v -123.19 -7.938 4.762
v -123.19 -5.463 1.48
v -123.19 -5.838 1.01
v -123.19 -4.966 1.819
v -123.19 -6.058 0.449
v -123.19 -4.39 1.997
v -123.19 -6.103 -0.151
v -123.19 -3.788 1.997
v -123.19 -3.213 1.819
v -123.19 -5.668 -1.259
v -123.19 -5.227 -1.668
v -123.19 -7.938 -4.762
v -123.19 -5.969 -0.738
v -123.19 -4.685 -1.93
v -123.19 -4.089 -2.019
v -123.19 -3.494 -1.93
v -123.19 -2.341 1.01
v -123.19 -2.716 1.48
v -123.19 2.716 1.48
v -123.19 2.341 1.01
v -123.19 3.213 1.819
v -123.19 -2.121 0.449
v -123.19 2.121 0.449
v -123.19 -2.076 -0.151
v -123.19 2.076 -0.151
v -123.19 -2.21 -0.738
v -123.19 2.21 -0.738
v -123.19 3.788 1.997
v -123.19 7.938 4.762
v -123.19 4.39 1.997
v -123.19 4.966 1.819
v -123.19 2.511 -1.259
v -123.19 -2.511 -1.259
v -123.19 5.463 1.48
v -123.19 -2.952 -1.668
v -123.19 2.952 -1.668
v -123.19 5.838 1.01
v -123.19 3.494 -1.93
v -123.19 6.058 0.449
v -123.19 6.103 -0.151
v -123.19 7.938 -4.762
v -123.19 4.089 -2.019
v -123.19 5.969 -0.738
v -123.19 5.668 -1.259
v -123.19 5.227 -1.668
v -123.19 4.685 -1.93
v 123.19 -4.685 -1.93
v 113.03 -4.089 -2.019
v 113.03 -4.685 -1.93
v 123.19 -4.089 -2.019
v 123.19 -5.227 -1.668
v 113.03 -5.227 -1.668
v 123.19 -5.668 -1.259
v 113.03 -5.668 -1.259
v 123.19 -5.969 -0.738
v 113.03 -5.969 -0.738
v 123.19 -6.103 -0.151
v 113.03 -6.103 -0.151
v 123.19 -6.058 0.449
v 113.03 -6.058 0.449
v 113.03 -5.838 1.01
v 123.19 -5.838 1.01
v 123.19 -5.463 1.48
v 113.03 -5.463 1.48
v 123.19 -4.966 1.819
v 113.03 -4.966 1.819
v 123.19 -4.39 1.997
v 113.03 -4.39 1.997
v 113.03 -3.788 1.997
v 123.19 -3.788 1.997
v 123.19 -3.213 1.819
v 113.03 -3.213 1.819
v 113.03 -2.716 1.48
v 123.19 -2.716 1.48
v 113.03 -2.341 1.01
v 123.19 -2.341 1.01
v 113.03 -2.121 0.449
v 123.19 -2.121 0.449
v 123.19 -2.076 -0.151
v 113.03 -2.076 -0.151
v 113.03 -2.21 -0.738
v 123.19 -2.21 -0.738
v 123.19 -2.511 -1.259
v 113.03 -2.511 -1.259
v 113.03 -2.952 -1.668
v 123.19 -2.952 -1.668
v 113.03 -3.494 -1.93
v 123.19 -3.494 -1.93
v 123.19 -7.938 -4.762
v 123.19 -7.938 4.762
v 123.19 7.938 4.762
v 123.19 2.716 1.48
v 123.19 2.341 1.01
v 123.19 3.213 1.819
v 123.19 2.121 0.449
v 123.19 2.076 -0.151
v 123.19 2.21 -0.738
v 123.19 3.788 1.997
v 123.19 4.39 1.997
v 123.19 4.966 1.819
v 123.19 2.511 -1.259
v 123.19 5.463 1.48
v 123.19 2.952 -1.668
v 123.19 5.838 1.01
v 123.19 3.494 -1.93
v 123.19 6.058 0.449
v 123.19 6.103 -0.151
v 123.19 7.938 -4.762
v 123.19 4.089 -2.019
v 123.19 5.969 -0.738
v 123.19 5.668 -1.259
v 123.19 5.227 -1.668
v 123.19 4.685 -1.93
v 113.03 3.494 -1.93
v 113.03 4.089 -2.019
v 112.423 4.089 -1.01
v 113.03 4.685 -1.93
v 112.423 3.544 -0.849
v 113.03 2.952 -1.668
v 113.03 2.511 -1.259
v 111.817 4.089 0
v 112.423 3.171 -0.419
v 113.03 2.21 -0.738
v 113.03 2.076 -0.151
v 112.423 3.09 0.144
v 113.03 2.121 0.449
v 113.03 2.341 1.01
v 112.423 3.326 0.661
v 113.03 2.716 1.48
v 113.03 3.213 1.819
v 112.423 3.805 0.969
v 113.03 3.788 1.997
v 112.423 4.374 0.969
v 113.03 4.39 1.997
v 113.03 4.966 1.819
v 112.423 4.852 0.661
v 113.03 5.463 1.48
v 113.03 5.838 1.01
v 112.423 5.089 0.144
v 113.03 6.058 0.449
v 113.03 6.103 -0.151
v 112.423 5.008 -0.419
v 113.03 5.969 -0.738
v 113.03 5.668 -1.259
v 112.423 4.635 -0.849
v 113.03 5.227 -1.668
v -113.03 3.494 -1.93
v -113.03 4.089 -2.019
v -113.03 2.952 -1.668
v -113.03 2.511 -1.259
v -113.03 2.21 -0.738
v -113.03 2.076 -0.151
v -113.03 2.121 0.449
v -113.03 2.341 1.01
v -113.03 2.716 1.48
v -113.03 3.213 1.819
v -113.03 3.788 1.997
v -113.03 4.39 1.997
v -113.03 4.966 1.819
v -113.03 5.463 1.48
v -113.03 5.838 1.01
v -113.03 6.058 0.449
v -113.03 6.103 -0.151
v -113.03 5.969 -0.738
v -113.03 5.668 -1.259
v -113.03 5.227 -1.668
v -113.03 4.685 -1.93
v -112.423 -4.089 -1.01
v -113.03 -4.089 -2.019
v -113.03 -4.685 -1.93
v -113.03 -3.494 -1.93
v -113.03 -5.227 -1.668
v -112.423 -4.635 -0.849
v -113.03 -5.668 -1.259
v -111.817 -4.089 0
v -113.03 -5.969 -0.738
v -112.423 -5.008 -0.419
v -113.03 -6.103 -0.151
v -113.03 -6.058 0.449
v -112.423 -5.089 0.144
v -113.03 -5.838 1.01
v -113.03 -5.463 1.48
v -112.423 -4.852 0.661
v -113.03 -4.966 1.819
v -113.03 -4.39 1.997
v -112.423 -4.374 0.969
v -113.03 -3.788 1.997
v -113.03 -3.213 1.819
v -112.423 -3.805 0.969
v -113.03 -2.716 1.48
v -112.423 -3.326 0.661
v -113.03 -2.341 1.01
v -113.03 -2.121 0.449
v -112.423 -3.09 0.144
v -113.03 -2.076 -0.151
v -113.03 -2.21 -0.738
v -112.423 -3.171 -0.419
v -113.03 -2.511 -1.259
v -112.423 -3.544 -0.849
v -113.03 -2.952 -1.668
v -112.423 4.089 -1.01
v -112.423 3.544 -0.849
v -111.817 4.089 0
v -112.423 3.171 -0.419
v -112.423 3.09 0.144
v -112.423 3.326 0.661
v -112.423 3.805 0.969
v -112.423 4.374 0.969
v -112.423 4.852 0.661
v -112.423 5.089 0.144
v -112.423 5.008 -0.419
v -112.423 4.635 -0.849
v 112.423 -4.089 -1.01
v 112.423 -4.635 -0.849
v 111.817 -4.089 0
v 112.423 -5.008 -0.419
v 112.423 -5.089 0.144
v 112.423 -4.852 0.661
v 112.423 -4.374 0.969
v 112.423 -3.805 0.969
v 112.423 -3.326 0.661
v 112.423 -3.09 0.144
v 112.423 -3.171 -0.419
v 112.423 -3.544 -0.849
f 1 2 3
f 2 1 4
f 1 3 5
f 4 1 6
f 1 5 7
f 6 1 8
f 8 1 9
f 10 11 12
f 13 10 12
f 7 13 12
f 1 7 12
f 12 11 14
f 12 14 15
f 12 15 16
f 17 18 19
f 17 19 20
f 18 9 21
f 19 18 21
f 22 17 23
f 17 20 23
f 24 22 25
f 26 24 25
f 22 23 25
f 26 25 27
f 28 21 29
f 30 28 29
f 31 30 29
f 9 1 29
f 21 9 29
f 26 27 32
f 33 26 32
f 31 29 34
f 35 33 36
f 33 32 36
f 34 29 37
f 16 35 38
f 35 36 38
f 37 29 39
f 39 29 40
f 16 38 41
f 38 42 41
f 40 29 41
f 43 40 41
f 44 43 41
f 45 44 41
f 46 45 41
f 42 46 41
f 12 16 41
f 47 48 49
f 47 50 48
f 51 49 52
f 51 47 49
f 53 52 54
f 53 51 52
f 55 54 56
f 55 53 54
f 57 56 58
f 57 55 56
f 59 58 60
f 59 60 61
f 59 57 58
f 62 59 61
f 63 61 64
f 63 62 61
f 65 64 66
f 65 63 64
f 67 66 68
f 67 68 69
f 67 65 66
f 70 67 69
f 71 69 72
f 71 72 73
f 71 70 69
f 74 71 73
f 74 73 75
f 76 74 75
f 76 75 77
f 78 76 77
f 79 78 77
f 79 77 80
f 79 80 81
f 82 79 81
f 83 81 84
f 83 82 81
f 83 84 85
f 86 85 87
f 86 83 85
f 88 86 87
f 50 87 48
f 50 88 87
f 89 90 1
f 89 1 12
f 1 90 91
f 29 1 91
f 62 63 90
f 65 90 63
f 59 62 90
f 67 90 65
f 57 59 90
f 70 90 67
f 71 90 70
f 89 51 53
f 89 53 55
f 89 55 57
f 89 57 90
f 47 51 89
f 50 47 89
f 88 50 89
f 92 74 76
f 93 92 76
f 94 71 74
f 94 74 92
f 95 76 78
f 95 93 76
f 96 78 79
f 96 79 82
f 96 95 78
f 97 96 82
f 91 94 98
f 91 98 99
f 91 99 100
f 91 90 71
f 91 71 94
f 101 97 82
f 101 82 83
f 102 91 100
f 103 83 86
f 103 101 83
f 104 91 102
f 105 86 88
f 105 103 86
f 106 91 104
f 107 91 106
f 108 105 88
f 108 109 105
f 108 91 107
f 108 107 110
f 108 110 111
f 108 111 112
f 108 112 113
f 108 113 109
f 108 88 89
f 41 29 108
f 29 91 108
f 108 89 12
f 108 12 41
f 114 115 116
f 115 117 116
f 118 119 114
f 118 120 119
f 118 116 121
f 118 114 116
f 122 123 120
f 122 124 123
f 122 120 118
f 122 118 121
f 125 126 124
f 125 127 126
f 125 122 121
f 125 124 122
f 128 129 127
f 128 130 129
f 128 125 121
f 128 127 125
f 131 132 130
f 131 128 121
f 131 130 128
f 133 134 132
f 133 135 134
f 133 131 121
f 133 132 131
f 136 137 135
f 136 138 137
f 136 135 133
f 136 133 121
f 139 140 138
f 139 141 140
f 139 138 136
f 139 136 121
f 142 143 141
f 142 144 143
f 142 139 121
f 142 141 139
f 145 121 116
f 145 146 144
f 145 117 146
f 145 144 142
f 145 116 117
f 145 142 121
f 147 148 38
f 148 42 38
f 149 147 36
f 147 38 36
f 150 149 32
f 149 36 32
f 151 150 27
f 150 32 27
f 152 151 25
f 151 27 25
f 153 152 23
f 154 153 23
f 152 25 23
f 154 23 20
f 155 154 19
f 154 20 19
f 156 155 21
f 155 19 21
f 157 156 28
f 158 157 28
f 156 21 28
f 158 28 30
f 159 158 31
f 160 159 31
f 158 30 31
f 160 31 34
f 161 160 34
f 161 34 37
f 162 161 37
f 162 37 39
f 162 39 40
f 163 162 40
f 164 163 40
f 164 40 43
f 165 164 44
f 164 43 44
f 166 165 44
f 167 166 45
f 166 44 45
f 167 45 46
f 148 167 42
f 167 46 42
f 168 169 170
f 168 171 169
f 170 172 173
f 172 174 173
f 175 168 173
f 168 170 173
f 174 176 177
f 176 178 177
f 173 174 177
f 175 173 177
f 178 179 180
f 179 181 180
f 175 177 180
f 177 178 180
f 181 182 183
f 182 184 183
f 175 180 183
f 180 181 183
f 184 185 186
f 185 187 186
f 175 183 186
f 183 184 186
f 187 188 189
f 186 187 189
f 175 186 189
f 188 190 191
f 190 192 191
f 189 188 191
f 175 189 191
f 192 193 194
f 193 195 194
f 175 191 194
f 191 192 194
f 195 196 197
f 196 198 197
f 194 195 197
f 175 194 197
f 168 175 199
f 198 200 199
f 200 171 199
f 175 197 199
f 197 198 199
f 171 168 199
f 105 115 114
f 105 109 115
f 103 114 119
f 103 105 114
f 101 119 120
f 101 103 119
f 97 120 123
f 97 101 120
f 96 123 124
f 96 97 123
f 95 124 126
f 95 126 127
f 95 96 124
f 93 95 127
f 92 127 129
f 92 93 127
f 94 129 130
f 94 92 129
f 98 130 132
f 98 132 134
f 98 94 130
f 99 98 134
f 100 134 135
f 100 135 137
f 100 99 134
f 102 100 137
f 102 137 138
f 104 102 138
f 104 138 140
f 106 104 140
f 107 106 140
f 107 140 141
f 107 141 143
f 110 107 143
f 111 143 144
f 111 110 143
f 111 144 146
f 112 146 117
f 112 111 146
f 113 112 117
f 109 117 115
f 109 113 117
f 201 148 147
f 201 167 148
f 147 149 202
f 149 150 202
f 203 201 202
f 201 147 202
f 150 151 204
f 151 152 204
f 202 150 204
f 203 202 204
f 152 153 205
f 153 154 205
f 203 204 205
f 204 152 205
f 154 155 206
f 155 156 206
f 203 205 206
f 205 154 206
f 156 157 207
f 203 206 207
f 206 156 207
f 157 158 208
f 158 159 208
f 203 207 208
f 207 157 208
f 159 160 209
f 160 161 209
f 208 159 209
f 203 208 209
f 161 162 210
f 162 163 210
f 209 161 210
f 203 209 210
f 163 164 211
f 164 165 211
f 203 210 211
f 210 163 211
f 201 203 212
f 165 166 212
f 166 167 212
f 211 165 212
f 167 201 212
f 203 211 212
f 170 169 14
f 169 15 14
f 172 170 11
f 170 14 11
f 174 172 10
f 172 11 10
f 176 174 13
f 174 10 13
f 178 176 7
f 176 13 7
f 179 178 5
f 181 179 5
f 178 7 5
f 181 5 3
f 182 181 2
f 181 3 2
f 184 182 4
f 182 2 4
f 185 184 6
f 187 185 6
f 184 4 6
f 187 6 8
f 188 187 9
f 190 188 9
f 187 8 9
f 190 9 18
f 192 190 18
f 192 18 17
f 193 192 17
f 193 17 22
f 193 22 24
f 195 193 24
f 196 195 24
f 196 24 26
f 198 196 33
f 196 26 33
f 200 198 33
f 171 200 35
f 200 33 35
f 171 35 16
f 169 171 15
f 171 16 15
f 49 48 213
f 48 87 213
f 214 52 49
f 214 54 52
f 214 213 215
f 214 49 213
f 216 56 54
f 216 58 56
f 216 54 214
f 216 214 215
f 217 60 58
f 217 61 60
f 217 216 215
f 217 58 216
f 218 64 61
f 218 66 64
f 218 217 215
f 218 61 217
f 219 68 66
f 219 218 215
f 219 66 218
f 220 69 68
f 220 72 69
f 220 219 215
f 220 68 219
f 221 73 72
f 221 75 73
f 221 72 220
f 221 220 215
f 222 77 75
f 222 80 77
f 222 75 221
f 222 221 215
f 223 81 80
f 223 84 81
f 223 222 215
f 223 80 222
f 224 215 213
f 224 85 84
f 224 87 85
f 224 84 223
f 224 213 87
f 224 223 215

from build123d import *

# Parameters (mm, degrees)
SKETCH1_W                           = 9.525
SKETCH1_H                           = 15.875
BOSS_EXTRUDE1_DEPTH                 = 123.19
TAP_DRILL_FOR_10_32_TAP1_AT_2_COUNT = 2
TAP_DRILL_FOR_10_32_TAP1_AT_2_PITCH = 8.1788


with BuildPart() as part:
    # Sketch1 → Boss-Extrude1 (new, symmetric)
    with BuildSketch(Plane(origin=(0, 0, 0), x_dir=(0, 0, -1), z_dir=(1, 0, 0))):
        Rectangle(SKETCH1_W, SKETCH1_H)
    extrude(amount=BOSS_EXTRUDE1_DEPTH, both=True)

    # Sketch4 → Tap Drill for #10-32 Tap1 (revolve, cut)
    with BuildSketch(Plane(origin=(123.19, 4.0894, 0), x_dir=(0, 0, -1), z_dir=(0, 1, 0))):
        Polygon((0, 0), (0, 11.373317848), (2.0193, 10.16), (2.0193, 0), align=None)
    tap_drill_for_10_32_tap1 = revolve(axis=Axis((129.54, 4.0894, 0), (-1, 0, 0)), mode=Mode.SUBTRACT)

    # Tap Drill for #10-32 Tap1 at 2: Tap Drill for #10-32 Tap1 ×2
    with Locations(*[(0, -i * TAP_DRILL_FOR_10_32_TAP1_AT_2_PITCH, 0) for i in range(1, TAP_DRILL_FOR_10_32_TAP1_AT_2_COUNT)]):
        add(tap_drill_for_10_32_tap1, mode=Mode.SUBTRACT)

    # Mirror1: Tap Drill for #10-32 Tap1 across plane
    add(tap_drill_for_10_32_tap1.mirror(Plane(origin=(0, 0, 0), x_dir=(0, 0, 1), z_dir=(1, 0, 0))), mode=Mode.SUBTRACT)

    # Mirror1 copy 1 sketch → Mirror1 copy 1 (revolve, cut)
    with BuildSketch(Plane(origin=(-123.19, -4.0894, 0), x_dir=(0, 0, -1), z_dir=(0, 1, 0))):
        Polygon((0, 0), (0, -11.373317848), (2.0193, -10.16), (2.0193, 0), align=None)
    revolve(axis=Axis((-129.54, -4.0894, 0), (-1, 0, 0)), mode=Mode.SUBTRACT)


solid = part.part
